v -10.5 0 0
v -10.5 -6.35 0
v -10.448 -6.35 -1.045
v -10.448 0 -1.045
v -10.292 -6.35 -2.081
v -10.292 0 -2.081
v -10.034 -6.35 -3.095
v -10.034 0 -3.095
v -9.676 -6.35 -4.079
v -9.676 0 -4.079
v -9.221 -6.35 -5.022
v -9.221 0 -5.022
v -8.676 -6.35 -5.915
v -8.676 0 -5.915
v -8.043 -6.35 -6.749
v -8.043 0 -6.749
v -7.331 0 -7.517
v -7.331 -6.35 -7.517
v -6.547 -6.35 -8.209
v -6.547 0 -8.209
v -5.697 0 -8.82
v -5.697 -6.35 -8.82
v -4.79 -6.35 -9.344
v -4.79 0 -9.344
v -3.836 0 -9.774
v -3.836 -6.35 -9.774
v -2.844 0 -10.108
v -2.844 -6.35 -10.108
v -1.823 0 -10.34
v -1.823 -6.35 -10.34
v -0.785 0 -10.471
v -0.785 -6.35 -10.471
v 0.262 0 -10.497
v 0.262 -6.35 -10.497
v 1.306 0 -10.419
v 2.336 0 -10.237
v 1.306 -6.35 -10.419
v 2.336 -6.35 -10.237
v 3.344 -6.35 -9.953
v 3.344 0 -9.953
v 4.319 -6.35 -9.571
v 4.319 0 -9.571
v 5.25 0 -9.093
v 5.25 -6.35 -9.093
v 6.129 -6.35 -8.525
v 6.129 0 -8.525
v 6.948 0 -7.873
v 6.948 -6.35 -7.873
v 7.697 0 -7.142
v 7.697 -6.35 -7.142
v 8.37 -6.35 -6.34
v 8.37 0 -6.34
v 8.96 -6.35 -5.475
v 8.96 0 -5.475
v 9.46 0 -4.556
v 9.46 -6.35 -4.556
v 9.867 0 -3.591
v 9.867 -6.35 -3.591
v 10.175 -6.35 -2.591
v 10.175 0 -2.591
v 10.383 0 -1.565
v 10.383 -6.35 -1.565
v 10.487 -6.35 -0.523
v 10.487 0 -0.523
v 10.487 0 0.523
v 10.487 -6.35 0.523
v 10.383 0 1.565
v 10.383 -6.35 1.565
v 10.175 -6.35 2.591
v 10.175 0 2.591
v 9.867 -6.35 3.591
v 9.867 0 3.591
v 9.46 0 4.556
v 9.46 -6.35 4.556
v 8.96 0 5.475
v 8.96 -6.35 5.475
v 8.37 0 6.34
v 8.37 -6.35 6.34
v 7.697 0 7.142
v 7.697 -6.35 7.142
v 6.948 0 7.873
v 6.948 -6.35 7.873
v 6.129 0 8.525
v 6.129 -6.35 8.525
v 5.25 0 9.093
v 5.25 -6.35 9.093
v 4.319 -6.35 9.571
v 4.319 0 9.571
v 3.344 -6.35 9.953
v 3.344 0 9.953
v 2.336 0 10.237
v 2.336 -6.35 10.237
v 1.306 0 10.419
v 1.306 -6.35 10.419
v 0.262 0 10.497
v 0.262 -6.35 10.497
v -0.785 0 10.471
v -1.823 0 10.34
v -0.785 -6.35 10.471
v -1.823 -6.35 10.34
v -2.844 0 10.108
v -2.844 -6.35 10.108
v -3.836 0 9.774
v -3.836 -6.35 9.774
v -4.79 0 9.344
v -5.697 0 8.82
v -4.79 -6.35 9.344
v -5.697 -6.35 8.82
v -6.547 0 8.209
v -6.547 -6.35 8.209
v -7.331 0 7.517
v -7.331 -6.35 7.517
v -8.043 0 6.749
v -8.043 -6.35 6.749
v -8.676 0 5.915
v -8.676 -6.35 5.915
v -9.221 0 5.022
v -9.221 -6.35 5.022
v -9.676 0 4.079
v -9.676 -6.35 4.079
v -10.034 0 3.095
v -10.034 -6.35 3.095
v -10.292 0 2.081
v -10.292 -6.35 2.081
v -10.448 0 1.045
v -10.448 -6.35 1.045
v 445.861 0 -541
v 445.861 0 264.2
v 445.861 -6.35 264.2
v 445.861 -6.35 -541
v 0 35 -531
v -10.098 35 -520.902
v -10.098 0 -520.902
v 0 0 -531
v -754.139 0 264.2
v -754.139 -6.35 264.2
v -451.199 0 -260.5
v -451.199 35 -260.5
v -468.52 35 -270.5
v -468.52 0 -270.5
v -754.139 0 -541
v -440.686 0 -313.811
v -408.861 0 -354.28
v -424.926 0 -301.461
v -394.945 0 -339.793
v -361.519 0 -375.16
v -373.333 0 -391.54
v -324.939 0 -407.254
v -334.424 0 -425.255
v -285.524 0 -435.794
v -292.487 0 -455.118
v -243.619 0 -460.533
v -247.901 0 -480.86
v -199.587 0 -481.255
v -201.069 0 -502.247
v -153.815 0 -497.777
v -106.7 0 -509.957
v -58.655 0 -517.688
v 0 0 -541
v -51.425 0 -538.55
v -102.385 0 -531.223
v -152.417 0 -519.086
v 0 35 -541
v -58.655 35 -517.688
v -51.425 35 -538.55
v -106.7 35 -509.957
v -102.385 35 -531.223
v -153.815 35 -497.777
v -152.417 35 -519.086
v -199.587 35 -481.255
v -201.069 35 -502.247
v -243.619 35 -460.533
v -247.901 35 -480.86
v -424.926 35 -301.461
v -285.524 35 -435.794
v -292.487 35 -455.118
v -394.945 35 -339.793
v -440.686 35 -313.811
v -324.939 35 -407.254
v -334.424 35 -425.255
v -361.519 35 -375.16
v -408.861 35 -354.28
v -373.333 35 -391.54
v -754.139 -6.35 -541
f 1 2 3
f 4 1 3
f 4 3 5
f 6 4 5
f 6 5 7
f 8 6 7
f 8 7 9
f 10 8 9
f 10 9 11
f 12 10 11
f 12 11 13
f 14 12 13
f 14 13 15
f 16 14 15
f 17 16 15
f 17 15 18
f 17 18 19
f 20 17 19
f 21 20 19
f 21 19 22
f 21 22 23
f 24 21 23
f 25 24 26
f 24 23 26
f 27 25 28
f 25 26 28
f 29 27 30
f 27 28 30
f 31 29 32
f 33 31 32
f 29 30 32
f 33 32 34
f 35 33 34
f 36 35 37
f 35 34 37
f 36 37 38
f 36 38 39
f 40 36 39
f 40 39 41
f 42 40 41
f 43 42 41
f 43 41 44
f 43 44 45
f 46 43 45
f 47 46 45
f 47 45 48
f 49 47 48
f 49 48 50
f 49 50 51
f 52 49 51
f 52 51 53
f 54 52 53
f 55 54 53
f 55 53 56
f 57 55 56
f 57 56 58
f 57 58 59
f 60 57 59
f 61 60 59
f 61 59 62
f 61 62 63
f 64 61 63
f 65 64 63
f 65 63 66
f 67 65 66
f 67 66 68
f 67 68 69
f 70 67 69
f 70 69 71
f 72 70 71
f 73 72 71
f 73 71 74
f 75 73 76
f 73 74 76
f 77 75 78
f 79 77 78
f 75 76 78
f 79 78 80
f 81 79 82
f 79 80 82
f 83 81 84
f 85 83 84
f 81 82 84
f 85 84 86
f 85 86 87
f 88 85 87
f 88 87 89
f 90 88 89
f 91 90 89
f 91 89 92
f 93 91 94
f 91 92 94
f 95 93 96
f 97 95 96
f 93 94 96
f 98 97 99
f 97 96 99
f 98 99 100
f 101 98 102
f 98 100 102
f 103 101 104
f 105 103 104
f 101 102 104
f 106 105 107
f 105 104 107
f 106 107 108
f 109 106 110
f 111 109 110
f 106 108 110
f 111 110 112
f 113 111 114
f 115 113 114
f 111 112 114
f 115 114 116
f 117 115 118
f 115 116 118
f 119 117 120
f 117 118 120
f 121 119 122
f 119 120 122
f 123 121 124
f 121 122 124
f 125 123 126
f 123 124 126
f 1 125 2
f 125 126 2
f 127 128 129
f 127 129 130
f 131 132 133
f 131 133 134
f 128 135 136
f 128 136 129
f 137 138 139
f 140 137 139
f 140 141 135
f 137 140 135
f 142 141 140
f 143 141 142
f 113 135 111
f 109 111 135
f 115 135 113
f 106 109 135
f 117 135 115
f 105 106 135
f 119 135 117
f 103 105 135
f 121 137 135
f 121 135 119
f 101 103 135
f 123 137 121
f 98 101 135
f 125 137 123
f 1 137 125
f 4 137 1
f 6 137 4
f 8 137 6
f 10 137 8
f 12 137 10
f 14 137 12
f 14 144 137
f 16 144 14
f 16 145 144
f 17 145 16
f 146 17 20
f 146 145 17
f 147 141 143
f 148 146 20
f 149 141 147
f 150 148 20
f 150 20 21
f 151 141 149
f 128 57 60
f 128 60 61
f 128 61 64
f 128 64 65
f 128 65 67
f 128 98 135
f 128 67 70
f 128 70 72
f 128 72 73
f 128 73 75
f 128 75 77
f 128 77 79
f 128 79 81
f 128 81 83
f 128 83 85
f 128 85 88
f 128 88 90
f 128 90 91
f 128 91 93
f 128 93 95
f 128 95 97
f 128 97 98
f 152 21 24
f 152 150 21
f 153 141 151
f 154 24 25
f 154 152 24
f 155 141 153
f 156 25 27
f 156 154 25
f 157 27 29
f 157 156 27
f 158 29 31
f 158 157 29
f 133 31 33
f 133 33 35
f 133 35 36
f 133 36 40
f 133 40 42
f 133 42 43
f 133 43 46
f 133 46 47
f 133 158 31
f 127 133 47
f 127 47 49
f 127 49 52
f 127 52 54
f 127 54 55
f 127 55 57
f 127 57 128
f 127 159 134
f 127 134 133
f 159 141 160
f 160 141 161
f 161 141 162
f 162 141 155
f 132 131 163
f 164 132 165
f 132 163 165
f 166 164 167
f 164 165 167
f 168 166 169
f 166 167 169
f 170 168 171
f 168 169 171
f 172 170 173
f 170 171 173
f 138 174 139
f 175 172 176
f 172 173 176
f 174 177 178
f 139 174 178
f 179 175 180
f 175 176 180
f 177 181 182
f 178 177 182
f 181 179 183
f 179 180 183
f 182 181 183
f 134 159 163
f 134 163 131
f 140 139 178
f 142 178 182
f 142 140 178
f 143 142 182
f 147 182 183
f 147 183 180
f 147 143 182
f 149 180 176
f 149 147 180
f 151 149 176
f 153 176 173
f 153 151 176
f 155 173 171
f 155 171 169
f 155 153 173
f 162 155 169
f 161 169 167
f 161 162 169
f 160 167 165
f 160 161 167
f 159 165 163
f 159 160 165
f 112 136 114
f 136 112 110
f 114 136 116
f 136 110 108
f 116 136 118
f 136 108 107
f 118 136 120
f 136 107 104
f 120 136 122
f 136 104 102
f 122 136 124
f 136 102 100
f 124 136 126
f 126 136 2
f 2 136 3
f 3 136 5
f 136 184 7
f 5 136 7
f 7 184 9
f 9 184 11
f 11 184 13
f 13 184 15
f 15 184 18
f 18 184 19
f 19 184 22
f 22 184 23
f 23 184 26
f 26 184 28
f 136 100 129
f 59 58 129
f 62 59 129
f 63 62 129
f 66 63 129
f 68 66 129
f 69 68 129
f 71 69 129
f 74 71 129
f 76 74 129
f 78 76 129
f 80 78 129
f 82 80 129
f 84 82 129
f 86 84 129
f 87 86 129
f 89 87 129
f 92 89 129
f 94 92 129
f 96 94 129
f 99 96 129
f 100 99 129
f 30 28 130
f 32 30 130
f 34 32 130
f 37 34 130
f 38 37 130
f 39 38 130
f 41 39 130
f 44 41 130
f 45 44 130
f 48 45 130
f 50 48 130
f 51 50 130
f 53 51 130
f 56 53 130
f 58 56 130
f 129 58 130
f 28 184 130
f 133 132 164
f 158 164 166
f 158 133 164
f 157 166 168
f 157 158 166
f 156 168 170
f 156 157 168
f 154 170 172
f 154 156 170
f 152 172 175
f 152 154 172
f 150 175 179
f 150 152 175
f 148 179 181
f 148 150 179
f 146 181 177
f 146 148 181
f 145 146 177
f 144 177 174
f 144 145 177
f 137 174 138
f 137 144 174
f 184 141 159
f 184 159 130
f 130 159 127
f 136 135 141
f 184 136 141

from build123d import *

# Parameters (mm, degrees)
BOSS_EXTRUDE1_DEPTH    = 35
SKETCH4_W              = 1200
SKETCH4_H              = 805.2
BOSS_EXTRUDE2_DEPTH    = 6.35
CHAMFER1_SIZE          = 10
F_20_0MM_DOWEL_HOLE1_D = 21


with BuildPart() as part:
    # Sketch3 → Boss-Extrude1 (new body)
    with BuildSketch(Plane(origin=(0, 0, 0), x_dir=(1, 0, 0), z_dir=(0, 1, 0))):
        with BuildLine():
            Line((0, 541), (0, 521))
            ThreePointArc((0, 521), (-260.5, 451.199235372), (-451.199235372, 260.5))
            Line((-451.199235372, 260.5), (-468.519743447, 270.5))
            ThreePointArc((-468.519743447, 270.5), (-270.5, 468.519743447), (0, 541))
        make_face()
    extrude(amount=BOSS_EXTRUDE1_DEPTH)

    # Sketch4 → Boss-Extrude2 (add)
    with BuildSketch(Plane(origin=(0, 0, 0), x_dir=(1, 0, 0), z_dir=(0, 1, 0))):
        with Locations((-154.139235372, 138.4)):
            Rectangle(SKETCH4_W, SKETCH4_H)
    extrude(amount=-BOSS_EXTRUDE2_DEPTH)

    # Chamfer1
    # the kernel refuses this chamfer: 10 mm, written as the material it takes off along each edge
    with BuildSketch(Plane(origin=(0, 0, -521), x_dir=(-0.999953038196086, 0, 0.009691305506332204), z_dir=(0, 1, 0))) as chamfer1_piece_1:
        with BuildLine():
            Line((10.098340338, 0), (-CHAMFER1_SIZE * 0.00969130550633, -CHAMFER1_SIZE * 0.999953038196))
            Line((-CHAMFER1_SIZE * 0.00969130550633, -CHAMFER1_SIZE * 0.999953038196), (0, 0))
            ThreePointArc((0, 0), (5.192000536, -0.024447522), (10.098340338, 0))
        make_face()
    extrude(amount=60.969219121, mode=Mode.SUBTRACT)

    # Ø20.0mm Dowel Hole1 (through all)
    with Locations(Plane(origin=(0, 0, 0), x_dir=(1, 0, 0), z_dir=(0, 1, 0))):
        with Locations((0, 0)):
            Hole(F_20_0MM_DOWEL_HOLE1_D / 2)


solid = part.part
